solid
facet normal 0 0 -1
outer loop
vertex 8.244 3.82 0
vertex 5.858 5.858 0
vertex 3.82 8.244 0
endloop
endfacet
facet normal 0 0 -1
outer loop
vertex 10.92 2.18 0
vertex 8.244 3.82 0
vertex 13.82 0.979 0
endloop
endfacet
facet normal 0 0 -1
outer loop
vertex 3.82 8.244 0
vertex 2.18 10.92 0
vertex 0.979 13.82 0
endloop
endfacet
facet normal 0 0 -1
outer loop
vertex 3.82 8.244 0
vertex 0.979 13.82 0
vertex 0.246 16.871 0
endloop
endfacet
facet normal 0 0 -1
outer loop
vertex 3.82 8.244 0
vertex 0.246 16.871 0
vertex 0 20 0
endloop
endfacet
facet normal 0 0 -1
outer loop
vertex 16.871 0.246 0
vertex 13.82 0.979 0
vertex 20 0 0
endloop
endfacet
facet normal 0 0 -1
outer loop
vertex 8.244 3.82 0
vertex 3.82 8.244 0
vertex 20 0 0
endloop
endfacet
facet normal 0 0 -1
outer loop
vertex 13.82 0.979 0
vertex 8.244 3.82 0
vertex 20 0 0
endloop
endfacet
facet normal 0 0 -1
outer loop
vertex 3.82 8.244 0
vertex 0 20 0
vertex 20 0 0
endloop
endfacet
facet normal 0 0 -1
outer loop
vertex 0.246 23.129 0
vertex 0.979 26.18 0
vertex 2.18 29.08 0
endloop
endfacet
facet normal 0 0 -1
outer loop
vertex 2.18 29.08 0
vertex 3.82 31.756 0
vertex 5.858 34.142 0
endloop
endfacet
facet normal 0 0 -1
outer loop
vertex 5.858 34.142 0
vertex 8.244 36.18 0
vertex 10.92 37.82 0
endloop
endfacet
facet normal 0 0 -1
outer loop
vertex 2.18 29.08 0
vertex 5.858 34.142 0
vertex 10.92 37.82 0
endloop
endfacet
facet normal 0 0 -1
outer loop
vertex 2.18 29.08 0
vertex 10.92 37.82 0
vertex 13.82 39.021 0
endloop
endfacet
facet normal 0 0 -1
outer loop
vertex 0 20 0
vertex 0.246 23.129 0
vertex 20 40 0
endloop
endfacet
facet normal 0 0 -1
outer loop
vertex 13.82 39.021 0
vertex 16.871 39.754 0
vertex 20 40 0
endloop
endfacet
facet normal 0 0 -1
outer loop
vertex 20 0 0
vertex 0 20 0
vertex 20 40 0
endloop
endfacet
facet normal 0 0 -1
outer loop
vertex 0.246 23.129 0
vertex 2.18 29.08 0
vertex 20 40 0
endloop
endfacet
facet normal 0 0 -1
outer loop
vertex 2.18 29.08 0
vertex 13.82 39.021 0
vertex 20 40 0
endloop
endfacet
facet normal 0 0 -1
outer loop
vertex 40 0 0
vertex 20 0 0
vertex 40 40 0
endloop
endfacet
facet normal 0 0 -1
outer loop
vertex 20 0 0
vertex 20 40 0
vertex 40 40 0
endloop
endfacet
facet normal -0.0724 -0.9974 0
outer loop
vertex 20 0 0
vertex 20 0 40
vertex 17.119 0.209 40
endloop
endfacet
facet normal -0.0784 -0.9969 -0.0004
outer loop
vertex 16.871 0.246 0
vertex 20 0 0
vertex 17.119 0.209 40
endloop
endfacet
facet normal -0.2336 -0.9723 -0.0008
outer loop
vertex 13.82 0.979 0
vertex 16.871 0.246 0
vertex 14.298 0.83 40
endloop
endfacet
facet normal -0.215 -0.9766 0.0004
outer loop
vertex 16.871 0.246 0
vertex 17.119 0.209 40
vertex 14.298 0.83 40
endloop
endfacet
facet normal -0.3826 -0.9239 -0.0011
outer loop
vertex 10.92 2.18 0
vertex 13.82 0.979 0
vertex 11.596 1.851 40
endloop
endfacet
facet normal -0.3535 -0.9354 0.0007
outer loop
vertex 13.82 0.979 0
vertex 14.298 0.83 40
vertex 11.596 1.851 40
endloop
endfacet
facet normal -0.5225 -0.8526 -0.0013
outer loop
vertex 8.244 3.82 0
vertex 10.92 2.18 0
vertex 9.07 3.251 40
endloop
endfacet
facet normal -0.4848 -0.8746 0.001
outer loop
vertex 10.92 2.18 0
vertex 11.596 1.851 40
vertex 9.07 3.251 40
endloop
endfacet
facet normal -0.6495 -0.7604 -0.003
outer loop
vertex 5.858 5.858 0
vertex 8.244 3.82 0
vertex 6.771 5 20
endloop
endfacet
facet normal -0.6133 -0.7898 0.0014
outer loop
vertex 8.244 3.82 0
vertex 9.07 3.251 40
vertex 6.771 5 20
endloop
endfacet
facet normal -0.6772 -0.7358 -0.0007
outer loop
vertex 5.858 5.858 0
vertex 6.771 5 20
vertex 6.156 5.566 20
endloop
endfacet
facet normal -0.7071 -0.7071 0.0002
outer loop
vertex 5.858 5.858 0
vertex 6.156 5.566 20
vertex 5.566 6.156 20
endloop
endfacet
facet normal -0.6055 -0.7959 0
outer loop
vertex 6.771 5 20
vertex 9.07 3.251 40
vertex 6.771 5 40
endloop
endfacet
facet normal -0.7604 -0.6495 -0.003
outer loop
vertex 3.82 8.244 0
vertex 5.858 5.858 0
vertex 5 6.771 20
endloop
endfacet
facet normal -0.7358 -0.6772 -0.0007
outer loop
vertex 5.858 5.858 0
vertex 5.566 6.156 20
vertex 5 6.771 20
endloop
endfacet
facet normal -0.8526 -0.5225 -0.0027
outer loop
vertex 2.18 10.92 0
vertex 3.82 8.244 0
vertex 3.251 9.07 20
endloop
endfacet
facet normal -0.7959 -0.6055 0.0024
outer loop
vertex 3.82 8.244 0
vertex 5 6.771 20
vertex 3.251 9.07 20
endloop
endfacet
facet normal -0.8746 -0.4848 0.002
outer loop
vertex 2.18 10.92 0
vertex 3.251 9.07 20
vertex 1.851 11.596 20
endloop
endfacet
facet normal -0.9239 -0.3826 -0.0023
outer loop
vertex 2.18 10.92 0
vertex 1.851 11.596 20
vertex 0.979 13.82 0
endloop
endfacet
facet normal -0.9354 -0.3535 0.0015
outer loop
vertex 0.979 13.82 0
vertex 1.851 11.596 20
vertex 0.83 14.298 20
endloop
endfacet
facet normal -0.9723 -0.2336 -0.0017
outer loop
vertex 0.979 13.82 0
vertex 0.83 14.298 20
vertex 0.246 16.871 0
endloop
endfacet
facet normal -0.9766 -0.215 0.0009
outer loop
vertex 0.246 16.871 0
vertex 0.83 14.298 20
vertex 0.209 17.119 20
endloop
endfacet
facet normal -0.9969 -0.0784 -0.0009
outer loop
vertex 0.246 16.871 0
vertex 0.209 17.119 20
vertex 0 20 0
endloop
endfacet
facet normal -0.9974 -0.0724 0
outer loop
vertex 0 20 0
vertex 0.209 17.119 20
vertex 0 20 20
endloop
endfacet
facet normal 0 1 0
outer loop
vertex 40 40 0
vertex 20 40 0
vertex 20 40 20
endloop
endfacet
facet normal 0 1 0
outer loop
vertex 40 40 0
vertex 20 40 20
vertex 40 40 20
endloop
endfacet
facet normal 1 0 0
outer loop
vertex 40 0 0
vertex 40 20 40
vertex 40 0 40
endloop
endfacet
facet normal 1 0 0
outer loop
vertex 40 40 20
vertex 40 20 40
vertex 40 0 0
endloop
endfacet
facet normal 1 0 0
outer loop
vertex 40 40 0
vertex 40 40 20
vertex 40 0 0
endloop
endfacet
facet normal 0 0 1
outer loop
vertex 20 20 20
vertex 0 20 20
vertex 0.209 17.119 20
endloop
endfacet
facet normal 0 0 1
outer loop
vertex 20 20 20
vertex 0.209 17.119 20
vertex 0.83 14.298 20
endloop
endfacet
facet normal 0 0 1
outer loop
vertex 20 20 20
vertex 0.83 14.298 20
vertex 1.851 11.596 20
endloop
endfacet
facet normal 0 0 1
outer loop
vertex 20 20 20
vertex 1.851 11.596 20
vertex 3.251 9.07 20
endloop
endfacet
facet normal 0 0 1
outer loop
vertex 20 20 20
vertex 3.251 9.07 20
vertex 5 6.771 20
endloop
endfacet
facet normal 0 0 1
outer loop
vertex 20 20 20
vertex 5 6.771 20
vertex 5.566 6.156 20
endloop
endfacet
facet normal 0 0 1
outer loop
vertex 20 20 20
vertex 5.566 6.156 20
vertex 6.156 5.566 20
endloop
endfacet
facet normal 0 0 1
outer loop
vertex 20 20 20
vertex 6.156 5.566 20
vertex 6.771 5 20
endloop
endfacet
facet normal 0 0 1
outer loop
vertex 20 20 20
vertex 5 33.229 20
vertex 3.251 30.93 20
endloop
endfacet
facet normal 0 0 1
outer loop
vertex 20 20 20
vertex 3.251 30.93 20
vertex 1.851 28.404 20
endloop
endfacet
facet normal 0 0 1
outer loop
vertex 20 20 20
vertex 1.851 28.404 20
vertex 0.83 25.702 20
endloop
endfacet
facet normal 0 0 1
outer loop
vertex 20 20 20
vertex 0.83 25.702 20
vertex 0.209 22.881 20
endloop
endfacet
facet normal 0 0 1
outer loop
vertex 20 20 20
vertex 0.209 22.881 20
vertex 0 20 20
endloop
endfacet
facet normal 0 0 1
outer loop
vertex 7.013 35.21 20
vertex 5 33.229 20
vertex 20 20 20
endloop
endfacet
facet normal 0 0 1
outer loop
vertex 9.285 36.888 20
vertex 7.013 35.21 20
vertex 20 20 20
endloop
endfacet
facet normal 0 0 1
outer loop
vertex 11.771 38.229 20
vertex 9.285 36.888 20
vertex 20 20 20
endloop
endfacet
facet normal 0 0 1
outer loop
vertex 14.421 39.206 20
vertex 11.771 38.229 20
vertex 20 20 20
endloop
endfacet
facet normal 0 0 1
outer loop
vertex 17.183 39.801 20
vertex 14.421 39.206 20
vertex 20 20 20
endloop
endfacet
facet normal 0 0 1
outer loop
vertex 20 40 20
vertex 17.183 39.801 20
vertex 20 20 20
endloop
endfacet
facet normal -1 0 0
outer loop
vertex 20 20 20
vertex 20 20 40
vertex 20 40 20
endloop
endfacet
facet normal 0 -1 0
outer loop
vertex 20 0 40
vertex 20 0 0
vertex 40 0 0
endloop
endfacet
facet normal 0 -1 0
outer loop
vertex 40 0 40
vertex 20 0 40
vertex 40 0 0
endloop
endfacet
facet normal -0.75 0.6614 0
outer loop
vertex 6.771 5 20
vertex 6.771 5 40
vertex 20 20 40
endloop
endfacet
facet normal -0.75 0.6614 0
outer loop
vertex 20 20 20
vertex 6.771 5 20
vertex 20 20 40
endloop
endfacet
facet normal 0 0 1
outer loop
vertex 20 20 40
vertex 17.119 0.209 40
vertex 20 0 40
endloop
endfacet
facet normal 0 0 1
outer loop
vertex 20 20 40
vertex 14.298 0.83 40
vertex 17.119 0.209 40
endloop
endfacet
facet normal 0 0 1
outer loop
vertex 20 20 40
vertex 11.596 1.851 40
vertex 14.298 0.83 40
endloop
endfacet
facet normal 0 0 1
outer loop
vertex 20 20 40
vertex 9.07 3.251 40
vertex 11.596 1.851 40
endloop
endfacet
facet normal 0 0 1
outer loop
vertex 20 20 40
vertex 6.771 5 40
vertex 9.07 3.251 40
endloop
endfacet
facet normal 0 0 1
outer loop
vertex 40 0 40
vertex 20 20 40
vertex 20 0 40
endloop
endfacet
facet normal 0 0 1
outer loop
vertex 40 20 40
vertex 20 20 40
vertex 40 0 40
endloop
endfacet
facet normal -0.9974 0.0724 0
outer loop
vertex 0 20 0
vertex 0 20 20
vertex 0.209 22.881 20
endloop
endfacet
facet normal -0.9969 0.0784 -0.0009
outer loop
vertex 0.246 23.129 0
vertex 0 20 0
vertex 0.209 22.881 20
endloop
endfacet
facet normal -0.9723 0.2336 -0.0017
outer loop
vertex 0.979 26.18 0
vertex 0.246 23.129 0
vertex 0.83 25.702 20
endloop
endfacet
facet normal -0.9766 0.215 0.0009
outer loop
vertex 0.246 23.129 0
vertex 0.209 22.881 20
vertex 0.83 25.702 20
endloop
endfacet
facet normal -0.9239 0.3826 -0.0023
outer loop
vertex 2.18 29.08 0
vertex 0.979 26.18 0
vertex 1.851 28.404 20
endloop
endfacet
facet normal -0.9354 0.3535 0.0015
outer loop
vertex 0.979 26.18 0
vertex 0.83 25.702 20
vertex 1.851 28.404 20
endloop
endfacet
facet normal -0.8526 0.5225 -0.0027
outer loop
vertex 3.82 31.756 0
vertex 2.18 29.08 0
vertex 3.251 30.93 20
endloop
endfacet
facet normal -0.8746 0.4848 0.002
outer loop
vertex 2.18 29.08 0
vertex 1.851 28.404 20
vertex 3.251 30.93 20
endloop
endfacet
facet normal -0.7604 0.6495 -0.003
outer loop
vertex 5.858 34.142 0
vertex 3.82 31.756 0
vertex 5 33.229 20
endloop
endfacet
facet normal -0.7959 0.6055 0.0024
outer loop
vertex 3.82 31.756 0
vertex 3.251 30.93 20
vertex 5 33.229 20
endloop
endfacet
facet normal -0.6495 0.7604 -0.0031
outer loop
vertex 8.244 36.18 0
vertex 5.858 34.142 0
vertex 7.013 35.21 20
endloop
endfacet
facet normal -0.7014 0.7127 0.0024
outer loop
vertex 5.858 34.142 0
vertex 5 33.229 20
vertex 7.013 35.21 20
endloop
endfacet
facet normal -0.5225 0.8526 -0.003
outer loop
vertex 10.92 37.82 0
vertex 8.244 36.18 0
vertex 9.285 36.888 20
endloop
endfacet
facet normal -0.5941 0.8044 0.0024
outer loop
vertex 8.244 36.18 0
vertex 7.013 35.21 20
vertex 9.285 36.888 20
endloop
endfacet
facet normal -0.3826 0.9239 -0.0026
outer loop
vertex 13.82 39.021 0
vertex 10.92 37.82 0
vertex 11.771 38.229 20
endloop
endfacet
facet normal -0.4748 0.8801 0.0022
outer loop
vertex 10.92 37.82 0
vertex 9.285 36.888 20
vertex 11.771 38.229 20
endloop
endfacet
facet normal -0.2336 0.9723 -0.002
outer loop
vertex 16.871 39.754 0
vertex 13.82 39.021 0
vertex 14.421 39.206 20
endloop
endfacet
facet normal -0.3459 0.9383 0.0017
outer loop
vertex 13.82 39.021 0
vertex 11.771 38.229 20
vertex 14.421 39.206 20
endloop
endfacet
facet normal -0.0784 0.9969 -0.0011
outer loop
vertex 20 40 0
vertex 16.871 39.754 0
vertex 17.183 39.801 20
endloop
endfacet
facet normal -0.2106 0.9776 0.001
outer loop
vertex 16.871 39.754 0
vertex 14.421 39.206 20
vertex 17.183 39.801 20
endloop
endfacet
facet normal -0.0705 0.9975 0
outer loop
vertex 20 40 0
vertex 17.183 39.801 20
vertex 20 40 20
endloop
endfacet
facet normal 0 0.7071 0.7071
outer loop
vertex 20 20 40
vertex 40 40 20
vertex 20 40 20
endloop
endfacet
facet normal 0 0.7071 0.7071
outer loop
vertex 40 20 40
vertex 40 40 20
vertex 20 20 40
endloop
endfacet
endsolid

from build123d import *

# Parameters (mm, degrees)
SKETCH1_W           = 40
SKETCH1_H           = 40
BOSS_EXTRUDE1_DEPTH = 40
CUT_EXTRUDE1_DEPTH  = 40
SKETCH3_W           = 5
SKETCH3_H           = 20
CUT_EXTRUDE3_DEPTH  = 40
CUT_EXTRUDE4_DEPTH  = 40
SKETCH5_W           = 20
SKETCH5_H           = 20
CUT_EXTRUDE6_DEPTH  = 20
CUT_EXTRUDE8_DEPTH  = 20
BOSS_EXTRUDE3_DEPTH = 20


with BuildPart() as part:
    # Sketch1 → Boss-Extrude1 (new body)
    with BuildSketch(Plane.XY):
        with Locations((20, 20)):
            Rectangle(SKETCH1_W, SKETCH1_H)
    extrude(amount=BOSS_EXTRUDE1_DEPTH)

    # Sketch2 → Cut-Extrude1 (cut)
    with BuildSketch(Plane.XY.offset(40)):
        with BuildLine():
            ThreePointArc((0, 20), (5.857864376, 34.142135624), (20, 40))
            Line((20, 40), (0, 40))
            Line((0, 40), (0, 20))
        make_face()
        with BuildLine():
            ThreePointArc((20, 0), (5.857864376, 5.857864376), (0, 20))
            Line((0, 20), (0, 0))
            Line((0, 0), (20, 0))
        make_face()
    extrude(amount=-CUT_EXTRUDE1_DEPTH, mode=Mode.SUBTRACT)

    # Sketch3 → Cut-Extrude3 (cut)
    with BuildSketch(Plane(origin=(0, 40, 0), x_dir=(1, 0, 0), z_dir=(0, 1, 0))):
        with Locations((2.5, -30)):
            Rectangle(SKETCH3_W, SKETCH3_H)
    extrude(amount=-CUT_EXTRUDE3_DEPTH, mode=Mode.SUBTRACT)

    # Sketch4 → Cut-Extrude4 (cut)
    with BuildSketch(Plane(origin=(0, 0, 0), x_dir=(0, 0, -1), z_dir=(1, 0, 0))):
        Polygon((-20, 40), (-40, 20), (-40, 40), align=None)
    extrude(amount=CUT_EXTRUDE4_DEPTH, mode=Mode.SUBTRACT)

    # Sketch5 → Cut-Extrude6 (cut)
    with BuildSketch(Plane.XY.offset(40)):
        with Locations((30, 30)):
            Rectangle(SKETCH5_W, SKETCH5_H)
    extrude(amount=-CUT_EXTRUDE6_DEPTH, mode=Mode.SUBTRACT)

    # Sketch6 → Cut-Extrude8 (cut)
    with BuildSketch(Plane.XY.offset(40)):
        with BuildLine():
            Line((6.771243445, 5), (20, 20))
            Line((20, 20), (5, 20))
            Line((5, 20), (5, 6.771243445))
            ThreePointArc((5, 6.771243445), (5.857864376, 5.857864376), (6.771243445, 5))
        make_face()
        with BuildLine():
            Line((5, 20), (20, 20))
            Line((20, 20), (20, 40))
            ThreePointArc((20, 40), (1.771243445, 28.228756555), (5, 6.771243445))
            Line((5, 6.771243445), (5, 20))
        make_face()
    extrude(amount=-CUT_EXTRUDE8_DEPTH, mode=Mode.SUBTRACT)

    # Sketch7 → Boss-Extrude3 (add)
    with BuildSketch(Plane(origin=(40, 0, 0), x_dir=(0, 0, -1), z_dir=(1, 0, 0))):
        Polygon((-20, 40), (-40, 20), (-20, 20), align=None)
    extrude(amount=-BOSS_EXTRUDE3_DEPTH)


solid = part.part
